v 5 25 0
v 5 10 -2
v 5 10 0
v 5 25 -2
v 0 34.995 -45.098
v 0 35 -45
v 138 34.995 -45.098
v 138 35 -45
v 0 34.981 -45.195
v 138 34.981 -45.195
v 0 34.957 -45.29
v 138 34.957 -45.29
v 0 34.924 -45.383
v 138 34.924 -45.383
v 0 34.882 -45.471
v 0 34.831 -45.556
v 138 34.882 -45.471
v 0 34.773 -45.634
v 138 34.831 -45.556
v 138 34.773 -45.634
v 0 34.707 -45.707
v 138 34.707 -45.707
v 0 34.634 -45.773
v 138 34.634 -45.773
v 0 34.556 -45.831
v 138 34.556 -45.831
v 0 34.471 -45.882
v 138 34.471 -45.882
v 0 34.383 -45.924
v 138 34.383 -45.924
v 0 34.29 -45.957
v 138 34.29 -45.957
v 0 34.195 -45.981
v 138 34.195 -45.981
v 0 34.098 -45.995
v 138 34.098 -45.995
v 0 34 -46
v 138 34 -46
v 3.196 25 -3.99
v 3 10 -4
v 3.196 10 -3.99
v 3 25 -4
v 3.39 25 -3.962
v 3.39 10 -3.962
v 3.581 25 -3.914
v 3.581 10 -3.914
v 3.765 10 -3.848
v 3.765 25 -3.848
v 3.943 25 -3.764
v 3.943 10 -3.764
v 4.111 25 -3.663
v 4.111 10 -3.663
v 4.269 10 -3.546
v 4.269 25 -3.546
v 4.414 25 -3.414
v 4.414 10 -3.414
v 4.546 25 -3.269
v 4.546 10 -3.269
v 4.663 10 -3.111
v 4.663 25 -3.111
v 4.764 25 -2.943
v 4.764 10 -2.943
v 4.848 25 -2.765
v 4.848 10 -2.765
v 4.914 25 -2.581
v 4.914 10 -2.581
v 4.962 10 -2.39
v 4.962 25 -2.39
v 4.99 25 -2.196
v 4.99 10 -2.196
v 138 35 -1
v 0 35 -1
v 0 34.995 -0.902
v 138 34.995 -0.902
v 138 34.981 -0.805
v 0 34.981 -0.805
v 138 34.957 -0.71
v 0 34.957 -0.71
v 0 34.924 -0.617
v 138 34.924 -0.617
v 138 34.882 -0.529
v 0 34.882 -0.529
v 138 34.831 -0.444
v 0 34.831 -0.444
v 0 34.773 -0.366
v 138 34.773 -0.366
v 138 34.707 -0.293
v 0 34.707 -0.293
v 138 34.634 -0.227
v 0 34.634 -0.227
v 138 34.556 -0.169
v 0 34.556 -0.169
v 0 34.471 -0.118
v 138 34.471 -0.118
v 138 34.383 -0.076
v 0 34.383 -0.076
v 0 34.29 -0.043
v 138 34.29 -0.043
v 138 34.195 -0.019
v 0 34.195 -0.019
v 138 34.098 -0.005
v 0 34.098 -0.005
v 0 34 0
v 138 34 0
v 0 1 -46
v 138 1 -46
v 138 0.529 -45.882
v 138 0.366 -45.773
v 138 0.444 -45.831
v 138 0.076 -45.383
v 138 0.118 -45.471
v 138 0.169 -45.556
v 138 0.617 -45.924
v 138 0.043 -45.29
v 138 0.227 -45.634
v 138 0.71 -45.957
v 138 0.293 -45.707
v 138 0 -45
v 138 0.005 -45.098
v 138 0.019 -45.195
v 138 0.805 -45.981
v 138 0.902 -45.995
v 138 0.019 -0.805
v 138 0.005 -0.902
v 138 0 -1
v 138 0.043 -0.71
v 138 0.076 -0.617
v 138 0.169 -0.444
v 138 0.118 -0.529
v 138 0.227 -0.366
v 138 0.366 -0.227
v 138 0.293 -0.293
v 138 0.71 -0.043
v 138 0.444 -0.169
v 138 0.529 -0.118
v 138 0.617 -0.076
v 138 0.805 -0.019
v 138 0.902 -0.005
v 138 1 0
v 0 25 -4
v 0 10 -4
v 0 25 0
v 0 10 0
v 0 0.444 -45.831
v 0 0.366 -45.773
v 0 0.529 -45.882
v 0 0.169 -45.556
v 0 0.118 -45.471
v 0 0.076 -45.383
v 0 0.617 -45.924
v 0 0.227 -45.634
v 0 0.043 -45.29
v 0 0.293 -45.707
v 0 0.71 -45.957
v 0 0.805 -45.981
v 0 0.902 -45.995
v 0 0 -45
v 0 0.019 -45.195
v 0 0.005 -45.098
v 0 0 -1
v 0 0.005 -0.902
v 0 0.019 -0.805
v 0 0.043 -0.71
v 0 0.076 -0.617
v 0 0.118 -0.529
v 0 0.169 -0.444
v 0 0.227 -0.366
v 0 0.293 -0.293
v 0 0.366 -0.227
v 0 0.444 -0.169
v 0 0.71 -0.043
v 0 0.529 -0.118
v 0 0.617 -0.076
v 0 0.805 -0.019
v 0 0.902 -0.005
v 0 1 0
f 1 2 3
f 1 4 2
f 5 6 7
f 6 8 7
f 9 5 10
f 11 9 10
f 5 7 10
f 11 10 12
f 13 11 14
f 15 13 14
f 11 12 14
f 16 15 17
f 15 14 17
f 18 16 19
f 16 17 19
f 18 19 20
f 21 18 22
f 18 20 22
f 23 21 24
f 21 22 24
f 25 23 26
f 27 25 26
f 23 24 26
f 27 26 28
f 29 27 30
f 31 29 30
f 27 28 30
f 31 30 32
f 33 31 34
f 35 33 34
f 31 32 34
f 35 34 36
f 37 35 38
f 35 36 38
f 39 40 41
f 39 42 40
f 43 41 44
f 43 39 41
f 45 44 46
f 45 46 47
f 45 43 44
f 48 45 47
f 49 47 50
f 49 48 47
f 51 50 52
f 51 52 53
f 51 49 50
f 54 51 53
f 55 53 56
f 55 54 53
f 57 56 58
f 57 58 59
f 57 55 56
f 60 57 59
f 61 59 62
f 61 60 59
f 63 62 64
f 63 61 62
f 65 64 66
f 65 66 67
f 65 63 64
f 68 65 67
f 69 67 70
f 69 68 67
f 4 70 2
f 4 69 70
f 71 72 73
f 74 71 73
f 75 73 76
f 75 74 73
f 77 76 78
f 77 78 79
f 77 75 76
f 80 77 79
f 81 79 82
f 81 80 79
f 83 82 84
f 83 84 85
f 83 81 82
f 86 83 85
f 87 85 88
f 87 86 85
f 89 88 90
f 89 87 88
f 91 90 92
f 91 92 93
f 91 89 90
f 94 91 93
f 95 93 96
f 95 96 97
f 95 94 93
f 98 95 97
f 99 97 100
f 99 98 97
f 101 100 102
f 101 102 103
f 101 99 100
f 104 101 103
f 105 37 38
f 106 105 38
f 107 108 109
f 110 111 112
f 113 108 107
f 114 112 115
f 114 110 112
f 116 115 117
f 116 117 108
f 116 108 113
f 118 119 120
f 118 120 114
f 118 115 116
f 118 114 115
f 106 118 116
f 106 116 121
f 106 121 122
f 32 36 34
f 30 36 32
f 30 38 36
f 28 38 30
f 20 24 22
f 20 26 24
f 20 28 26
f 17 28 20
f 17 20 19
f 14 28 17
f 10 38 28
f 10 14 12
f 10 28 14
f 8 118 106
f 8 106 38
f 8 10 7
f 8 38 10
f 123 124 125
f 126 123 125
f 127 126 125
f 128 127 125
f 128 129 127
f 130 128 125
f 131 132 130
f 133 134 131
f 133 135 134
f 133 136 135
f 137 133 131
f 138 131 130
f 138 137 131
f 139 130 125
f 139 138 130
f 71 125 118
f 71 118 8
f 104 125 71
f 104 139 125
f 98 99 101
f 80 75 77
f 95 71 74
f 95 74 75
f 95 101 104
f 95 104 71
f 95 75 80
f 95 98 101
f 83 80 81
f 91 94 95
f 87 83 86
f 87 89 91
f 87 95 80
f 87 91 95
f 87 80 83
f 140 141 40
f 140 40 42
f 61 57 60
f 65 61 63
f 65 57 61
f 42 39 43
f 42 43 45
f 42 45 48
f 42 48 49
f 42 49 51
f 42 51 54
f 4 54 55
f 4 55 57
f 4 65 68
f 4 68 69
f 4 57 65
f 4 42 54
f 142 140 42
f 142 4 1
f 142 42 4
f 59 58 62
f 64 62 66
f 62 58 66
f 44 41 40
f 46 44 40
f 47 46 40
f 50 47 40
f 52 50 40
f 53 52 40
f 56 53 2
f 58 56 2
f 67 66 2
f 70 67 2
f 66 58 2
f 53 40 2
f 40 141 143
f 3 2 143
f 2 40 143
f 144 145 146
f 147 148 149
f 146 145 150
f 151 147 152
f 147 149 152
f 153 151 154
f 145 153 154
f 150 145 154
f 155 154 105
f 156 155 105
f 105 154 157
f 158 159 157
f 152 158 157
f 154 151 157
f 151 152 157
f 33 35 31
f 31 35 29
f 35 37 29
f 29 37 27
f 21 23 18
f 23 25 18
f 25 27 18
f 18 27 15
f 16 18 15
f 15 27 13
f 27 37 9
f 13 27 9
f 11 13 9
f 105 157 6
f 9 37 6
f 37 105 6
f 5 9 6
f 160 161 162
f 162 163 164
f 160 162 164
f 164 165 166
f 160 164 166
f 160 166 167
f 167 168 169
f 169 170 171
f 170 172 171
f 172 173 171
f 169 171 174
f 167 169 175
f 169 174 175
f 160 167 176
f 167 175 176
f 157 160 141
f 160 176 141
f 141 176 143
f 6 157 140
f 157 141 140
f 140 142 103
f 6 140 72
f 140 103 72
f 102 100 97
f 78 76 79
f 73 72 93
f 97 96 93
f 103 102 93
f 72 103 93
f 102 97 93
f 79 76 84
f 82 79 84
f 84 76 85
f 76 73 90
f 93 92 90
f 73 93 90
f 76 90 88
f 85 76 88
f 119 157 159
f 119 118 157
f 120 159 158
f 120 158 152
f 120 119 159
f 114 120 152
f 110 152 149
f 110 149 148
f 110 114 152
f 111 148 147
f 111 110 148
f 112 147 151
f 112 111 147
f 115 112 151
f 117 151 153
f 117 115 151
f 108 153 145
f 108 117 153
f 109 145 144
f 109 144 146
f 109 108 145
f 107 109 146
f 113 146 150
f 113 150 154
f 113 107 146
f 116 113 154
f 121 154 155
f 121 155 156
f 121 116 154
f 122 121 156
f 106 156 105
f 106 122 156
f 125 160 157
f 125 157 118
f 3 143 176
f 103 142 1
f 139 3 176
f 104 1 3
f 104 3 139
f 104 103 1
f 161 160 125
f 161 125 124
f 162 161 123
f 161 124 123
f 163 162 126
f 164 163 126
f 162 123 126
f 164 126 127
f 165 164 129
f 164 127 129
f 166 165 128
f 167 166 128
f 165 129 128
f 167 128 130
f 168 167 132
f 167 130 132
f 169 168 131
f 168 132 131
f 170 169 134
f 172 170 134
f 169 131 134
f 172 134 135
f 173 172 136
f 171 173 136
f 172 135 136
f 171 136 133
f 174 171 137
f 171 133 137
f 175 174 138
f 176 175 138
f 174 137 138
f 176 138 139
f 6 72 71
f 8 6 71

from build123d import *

# Parameters (mm, degrees)
SKETCH1_W           = 138
SKETCH1_H           = 35
BOSS_EXTRUDE1_DEPTH = 46
FILLET2_R           = 1
SKETCH4_W           = 4
SKETCH4_H           = 15
CUT_EXTRUDE2_DEPTH  = 5
FILLET3_R           = 2


with BuildPart() as part:
    # Sketch1 → Boss-Extrude1 (new body)
    with BuildSketch(Plane.XY):
        with Locations((69, 17.5)):
            Rectangle(SKETCH1_W, SKETCH1_H)
    extrude(amount=-BOSS_EXTRUDE1_DEPTH)

    # Fillet2
    fillet2_edges = [part.edges().sort_by_distance(p)[0] for p in [
        (69, 35, -46),
        (69, 35, 0),
        (69, 0, 0),
        (69, 0, -46),
    ]]
    fillet(fillet2_edges, radius=FILLET2_R)

    # Sketch4 → Cut-Extrude2 (cut)
    with BuildSketch(Plane.ZY):
        with Locations((-2, 17.5)):
            Rectangle(SKETCH4_W, SKETCH4_H)
    extrude(amount=-CUT_EXTRUDE2_DEPTH, mode=Mode.SUBTRACT)

    # Fillet3
    fillet3_edges = [part.edges().sort_by_distance(p)[0] for p in [
        (5, 17.5, -4),
    ]]
    fillet(fillet3_edges, radius=FILLET3_R)


solid = part.part
